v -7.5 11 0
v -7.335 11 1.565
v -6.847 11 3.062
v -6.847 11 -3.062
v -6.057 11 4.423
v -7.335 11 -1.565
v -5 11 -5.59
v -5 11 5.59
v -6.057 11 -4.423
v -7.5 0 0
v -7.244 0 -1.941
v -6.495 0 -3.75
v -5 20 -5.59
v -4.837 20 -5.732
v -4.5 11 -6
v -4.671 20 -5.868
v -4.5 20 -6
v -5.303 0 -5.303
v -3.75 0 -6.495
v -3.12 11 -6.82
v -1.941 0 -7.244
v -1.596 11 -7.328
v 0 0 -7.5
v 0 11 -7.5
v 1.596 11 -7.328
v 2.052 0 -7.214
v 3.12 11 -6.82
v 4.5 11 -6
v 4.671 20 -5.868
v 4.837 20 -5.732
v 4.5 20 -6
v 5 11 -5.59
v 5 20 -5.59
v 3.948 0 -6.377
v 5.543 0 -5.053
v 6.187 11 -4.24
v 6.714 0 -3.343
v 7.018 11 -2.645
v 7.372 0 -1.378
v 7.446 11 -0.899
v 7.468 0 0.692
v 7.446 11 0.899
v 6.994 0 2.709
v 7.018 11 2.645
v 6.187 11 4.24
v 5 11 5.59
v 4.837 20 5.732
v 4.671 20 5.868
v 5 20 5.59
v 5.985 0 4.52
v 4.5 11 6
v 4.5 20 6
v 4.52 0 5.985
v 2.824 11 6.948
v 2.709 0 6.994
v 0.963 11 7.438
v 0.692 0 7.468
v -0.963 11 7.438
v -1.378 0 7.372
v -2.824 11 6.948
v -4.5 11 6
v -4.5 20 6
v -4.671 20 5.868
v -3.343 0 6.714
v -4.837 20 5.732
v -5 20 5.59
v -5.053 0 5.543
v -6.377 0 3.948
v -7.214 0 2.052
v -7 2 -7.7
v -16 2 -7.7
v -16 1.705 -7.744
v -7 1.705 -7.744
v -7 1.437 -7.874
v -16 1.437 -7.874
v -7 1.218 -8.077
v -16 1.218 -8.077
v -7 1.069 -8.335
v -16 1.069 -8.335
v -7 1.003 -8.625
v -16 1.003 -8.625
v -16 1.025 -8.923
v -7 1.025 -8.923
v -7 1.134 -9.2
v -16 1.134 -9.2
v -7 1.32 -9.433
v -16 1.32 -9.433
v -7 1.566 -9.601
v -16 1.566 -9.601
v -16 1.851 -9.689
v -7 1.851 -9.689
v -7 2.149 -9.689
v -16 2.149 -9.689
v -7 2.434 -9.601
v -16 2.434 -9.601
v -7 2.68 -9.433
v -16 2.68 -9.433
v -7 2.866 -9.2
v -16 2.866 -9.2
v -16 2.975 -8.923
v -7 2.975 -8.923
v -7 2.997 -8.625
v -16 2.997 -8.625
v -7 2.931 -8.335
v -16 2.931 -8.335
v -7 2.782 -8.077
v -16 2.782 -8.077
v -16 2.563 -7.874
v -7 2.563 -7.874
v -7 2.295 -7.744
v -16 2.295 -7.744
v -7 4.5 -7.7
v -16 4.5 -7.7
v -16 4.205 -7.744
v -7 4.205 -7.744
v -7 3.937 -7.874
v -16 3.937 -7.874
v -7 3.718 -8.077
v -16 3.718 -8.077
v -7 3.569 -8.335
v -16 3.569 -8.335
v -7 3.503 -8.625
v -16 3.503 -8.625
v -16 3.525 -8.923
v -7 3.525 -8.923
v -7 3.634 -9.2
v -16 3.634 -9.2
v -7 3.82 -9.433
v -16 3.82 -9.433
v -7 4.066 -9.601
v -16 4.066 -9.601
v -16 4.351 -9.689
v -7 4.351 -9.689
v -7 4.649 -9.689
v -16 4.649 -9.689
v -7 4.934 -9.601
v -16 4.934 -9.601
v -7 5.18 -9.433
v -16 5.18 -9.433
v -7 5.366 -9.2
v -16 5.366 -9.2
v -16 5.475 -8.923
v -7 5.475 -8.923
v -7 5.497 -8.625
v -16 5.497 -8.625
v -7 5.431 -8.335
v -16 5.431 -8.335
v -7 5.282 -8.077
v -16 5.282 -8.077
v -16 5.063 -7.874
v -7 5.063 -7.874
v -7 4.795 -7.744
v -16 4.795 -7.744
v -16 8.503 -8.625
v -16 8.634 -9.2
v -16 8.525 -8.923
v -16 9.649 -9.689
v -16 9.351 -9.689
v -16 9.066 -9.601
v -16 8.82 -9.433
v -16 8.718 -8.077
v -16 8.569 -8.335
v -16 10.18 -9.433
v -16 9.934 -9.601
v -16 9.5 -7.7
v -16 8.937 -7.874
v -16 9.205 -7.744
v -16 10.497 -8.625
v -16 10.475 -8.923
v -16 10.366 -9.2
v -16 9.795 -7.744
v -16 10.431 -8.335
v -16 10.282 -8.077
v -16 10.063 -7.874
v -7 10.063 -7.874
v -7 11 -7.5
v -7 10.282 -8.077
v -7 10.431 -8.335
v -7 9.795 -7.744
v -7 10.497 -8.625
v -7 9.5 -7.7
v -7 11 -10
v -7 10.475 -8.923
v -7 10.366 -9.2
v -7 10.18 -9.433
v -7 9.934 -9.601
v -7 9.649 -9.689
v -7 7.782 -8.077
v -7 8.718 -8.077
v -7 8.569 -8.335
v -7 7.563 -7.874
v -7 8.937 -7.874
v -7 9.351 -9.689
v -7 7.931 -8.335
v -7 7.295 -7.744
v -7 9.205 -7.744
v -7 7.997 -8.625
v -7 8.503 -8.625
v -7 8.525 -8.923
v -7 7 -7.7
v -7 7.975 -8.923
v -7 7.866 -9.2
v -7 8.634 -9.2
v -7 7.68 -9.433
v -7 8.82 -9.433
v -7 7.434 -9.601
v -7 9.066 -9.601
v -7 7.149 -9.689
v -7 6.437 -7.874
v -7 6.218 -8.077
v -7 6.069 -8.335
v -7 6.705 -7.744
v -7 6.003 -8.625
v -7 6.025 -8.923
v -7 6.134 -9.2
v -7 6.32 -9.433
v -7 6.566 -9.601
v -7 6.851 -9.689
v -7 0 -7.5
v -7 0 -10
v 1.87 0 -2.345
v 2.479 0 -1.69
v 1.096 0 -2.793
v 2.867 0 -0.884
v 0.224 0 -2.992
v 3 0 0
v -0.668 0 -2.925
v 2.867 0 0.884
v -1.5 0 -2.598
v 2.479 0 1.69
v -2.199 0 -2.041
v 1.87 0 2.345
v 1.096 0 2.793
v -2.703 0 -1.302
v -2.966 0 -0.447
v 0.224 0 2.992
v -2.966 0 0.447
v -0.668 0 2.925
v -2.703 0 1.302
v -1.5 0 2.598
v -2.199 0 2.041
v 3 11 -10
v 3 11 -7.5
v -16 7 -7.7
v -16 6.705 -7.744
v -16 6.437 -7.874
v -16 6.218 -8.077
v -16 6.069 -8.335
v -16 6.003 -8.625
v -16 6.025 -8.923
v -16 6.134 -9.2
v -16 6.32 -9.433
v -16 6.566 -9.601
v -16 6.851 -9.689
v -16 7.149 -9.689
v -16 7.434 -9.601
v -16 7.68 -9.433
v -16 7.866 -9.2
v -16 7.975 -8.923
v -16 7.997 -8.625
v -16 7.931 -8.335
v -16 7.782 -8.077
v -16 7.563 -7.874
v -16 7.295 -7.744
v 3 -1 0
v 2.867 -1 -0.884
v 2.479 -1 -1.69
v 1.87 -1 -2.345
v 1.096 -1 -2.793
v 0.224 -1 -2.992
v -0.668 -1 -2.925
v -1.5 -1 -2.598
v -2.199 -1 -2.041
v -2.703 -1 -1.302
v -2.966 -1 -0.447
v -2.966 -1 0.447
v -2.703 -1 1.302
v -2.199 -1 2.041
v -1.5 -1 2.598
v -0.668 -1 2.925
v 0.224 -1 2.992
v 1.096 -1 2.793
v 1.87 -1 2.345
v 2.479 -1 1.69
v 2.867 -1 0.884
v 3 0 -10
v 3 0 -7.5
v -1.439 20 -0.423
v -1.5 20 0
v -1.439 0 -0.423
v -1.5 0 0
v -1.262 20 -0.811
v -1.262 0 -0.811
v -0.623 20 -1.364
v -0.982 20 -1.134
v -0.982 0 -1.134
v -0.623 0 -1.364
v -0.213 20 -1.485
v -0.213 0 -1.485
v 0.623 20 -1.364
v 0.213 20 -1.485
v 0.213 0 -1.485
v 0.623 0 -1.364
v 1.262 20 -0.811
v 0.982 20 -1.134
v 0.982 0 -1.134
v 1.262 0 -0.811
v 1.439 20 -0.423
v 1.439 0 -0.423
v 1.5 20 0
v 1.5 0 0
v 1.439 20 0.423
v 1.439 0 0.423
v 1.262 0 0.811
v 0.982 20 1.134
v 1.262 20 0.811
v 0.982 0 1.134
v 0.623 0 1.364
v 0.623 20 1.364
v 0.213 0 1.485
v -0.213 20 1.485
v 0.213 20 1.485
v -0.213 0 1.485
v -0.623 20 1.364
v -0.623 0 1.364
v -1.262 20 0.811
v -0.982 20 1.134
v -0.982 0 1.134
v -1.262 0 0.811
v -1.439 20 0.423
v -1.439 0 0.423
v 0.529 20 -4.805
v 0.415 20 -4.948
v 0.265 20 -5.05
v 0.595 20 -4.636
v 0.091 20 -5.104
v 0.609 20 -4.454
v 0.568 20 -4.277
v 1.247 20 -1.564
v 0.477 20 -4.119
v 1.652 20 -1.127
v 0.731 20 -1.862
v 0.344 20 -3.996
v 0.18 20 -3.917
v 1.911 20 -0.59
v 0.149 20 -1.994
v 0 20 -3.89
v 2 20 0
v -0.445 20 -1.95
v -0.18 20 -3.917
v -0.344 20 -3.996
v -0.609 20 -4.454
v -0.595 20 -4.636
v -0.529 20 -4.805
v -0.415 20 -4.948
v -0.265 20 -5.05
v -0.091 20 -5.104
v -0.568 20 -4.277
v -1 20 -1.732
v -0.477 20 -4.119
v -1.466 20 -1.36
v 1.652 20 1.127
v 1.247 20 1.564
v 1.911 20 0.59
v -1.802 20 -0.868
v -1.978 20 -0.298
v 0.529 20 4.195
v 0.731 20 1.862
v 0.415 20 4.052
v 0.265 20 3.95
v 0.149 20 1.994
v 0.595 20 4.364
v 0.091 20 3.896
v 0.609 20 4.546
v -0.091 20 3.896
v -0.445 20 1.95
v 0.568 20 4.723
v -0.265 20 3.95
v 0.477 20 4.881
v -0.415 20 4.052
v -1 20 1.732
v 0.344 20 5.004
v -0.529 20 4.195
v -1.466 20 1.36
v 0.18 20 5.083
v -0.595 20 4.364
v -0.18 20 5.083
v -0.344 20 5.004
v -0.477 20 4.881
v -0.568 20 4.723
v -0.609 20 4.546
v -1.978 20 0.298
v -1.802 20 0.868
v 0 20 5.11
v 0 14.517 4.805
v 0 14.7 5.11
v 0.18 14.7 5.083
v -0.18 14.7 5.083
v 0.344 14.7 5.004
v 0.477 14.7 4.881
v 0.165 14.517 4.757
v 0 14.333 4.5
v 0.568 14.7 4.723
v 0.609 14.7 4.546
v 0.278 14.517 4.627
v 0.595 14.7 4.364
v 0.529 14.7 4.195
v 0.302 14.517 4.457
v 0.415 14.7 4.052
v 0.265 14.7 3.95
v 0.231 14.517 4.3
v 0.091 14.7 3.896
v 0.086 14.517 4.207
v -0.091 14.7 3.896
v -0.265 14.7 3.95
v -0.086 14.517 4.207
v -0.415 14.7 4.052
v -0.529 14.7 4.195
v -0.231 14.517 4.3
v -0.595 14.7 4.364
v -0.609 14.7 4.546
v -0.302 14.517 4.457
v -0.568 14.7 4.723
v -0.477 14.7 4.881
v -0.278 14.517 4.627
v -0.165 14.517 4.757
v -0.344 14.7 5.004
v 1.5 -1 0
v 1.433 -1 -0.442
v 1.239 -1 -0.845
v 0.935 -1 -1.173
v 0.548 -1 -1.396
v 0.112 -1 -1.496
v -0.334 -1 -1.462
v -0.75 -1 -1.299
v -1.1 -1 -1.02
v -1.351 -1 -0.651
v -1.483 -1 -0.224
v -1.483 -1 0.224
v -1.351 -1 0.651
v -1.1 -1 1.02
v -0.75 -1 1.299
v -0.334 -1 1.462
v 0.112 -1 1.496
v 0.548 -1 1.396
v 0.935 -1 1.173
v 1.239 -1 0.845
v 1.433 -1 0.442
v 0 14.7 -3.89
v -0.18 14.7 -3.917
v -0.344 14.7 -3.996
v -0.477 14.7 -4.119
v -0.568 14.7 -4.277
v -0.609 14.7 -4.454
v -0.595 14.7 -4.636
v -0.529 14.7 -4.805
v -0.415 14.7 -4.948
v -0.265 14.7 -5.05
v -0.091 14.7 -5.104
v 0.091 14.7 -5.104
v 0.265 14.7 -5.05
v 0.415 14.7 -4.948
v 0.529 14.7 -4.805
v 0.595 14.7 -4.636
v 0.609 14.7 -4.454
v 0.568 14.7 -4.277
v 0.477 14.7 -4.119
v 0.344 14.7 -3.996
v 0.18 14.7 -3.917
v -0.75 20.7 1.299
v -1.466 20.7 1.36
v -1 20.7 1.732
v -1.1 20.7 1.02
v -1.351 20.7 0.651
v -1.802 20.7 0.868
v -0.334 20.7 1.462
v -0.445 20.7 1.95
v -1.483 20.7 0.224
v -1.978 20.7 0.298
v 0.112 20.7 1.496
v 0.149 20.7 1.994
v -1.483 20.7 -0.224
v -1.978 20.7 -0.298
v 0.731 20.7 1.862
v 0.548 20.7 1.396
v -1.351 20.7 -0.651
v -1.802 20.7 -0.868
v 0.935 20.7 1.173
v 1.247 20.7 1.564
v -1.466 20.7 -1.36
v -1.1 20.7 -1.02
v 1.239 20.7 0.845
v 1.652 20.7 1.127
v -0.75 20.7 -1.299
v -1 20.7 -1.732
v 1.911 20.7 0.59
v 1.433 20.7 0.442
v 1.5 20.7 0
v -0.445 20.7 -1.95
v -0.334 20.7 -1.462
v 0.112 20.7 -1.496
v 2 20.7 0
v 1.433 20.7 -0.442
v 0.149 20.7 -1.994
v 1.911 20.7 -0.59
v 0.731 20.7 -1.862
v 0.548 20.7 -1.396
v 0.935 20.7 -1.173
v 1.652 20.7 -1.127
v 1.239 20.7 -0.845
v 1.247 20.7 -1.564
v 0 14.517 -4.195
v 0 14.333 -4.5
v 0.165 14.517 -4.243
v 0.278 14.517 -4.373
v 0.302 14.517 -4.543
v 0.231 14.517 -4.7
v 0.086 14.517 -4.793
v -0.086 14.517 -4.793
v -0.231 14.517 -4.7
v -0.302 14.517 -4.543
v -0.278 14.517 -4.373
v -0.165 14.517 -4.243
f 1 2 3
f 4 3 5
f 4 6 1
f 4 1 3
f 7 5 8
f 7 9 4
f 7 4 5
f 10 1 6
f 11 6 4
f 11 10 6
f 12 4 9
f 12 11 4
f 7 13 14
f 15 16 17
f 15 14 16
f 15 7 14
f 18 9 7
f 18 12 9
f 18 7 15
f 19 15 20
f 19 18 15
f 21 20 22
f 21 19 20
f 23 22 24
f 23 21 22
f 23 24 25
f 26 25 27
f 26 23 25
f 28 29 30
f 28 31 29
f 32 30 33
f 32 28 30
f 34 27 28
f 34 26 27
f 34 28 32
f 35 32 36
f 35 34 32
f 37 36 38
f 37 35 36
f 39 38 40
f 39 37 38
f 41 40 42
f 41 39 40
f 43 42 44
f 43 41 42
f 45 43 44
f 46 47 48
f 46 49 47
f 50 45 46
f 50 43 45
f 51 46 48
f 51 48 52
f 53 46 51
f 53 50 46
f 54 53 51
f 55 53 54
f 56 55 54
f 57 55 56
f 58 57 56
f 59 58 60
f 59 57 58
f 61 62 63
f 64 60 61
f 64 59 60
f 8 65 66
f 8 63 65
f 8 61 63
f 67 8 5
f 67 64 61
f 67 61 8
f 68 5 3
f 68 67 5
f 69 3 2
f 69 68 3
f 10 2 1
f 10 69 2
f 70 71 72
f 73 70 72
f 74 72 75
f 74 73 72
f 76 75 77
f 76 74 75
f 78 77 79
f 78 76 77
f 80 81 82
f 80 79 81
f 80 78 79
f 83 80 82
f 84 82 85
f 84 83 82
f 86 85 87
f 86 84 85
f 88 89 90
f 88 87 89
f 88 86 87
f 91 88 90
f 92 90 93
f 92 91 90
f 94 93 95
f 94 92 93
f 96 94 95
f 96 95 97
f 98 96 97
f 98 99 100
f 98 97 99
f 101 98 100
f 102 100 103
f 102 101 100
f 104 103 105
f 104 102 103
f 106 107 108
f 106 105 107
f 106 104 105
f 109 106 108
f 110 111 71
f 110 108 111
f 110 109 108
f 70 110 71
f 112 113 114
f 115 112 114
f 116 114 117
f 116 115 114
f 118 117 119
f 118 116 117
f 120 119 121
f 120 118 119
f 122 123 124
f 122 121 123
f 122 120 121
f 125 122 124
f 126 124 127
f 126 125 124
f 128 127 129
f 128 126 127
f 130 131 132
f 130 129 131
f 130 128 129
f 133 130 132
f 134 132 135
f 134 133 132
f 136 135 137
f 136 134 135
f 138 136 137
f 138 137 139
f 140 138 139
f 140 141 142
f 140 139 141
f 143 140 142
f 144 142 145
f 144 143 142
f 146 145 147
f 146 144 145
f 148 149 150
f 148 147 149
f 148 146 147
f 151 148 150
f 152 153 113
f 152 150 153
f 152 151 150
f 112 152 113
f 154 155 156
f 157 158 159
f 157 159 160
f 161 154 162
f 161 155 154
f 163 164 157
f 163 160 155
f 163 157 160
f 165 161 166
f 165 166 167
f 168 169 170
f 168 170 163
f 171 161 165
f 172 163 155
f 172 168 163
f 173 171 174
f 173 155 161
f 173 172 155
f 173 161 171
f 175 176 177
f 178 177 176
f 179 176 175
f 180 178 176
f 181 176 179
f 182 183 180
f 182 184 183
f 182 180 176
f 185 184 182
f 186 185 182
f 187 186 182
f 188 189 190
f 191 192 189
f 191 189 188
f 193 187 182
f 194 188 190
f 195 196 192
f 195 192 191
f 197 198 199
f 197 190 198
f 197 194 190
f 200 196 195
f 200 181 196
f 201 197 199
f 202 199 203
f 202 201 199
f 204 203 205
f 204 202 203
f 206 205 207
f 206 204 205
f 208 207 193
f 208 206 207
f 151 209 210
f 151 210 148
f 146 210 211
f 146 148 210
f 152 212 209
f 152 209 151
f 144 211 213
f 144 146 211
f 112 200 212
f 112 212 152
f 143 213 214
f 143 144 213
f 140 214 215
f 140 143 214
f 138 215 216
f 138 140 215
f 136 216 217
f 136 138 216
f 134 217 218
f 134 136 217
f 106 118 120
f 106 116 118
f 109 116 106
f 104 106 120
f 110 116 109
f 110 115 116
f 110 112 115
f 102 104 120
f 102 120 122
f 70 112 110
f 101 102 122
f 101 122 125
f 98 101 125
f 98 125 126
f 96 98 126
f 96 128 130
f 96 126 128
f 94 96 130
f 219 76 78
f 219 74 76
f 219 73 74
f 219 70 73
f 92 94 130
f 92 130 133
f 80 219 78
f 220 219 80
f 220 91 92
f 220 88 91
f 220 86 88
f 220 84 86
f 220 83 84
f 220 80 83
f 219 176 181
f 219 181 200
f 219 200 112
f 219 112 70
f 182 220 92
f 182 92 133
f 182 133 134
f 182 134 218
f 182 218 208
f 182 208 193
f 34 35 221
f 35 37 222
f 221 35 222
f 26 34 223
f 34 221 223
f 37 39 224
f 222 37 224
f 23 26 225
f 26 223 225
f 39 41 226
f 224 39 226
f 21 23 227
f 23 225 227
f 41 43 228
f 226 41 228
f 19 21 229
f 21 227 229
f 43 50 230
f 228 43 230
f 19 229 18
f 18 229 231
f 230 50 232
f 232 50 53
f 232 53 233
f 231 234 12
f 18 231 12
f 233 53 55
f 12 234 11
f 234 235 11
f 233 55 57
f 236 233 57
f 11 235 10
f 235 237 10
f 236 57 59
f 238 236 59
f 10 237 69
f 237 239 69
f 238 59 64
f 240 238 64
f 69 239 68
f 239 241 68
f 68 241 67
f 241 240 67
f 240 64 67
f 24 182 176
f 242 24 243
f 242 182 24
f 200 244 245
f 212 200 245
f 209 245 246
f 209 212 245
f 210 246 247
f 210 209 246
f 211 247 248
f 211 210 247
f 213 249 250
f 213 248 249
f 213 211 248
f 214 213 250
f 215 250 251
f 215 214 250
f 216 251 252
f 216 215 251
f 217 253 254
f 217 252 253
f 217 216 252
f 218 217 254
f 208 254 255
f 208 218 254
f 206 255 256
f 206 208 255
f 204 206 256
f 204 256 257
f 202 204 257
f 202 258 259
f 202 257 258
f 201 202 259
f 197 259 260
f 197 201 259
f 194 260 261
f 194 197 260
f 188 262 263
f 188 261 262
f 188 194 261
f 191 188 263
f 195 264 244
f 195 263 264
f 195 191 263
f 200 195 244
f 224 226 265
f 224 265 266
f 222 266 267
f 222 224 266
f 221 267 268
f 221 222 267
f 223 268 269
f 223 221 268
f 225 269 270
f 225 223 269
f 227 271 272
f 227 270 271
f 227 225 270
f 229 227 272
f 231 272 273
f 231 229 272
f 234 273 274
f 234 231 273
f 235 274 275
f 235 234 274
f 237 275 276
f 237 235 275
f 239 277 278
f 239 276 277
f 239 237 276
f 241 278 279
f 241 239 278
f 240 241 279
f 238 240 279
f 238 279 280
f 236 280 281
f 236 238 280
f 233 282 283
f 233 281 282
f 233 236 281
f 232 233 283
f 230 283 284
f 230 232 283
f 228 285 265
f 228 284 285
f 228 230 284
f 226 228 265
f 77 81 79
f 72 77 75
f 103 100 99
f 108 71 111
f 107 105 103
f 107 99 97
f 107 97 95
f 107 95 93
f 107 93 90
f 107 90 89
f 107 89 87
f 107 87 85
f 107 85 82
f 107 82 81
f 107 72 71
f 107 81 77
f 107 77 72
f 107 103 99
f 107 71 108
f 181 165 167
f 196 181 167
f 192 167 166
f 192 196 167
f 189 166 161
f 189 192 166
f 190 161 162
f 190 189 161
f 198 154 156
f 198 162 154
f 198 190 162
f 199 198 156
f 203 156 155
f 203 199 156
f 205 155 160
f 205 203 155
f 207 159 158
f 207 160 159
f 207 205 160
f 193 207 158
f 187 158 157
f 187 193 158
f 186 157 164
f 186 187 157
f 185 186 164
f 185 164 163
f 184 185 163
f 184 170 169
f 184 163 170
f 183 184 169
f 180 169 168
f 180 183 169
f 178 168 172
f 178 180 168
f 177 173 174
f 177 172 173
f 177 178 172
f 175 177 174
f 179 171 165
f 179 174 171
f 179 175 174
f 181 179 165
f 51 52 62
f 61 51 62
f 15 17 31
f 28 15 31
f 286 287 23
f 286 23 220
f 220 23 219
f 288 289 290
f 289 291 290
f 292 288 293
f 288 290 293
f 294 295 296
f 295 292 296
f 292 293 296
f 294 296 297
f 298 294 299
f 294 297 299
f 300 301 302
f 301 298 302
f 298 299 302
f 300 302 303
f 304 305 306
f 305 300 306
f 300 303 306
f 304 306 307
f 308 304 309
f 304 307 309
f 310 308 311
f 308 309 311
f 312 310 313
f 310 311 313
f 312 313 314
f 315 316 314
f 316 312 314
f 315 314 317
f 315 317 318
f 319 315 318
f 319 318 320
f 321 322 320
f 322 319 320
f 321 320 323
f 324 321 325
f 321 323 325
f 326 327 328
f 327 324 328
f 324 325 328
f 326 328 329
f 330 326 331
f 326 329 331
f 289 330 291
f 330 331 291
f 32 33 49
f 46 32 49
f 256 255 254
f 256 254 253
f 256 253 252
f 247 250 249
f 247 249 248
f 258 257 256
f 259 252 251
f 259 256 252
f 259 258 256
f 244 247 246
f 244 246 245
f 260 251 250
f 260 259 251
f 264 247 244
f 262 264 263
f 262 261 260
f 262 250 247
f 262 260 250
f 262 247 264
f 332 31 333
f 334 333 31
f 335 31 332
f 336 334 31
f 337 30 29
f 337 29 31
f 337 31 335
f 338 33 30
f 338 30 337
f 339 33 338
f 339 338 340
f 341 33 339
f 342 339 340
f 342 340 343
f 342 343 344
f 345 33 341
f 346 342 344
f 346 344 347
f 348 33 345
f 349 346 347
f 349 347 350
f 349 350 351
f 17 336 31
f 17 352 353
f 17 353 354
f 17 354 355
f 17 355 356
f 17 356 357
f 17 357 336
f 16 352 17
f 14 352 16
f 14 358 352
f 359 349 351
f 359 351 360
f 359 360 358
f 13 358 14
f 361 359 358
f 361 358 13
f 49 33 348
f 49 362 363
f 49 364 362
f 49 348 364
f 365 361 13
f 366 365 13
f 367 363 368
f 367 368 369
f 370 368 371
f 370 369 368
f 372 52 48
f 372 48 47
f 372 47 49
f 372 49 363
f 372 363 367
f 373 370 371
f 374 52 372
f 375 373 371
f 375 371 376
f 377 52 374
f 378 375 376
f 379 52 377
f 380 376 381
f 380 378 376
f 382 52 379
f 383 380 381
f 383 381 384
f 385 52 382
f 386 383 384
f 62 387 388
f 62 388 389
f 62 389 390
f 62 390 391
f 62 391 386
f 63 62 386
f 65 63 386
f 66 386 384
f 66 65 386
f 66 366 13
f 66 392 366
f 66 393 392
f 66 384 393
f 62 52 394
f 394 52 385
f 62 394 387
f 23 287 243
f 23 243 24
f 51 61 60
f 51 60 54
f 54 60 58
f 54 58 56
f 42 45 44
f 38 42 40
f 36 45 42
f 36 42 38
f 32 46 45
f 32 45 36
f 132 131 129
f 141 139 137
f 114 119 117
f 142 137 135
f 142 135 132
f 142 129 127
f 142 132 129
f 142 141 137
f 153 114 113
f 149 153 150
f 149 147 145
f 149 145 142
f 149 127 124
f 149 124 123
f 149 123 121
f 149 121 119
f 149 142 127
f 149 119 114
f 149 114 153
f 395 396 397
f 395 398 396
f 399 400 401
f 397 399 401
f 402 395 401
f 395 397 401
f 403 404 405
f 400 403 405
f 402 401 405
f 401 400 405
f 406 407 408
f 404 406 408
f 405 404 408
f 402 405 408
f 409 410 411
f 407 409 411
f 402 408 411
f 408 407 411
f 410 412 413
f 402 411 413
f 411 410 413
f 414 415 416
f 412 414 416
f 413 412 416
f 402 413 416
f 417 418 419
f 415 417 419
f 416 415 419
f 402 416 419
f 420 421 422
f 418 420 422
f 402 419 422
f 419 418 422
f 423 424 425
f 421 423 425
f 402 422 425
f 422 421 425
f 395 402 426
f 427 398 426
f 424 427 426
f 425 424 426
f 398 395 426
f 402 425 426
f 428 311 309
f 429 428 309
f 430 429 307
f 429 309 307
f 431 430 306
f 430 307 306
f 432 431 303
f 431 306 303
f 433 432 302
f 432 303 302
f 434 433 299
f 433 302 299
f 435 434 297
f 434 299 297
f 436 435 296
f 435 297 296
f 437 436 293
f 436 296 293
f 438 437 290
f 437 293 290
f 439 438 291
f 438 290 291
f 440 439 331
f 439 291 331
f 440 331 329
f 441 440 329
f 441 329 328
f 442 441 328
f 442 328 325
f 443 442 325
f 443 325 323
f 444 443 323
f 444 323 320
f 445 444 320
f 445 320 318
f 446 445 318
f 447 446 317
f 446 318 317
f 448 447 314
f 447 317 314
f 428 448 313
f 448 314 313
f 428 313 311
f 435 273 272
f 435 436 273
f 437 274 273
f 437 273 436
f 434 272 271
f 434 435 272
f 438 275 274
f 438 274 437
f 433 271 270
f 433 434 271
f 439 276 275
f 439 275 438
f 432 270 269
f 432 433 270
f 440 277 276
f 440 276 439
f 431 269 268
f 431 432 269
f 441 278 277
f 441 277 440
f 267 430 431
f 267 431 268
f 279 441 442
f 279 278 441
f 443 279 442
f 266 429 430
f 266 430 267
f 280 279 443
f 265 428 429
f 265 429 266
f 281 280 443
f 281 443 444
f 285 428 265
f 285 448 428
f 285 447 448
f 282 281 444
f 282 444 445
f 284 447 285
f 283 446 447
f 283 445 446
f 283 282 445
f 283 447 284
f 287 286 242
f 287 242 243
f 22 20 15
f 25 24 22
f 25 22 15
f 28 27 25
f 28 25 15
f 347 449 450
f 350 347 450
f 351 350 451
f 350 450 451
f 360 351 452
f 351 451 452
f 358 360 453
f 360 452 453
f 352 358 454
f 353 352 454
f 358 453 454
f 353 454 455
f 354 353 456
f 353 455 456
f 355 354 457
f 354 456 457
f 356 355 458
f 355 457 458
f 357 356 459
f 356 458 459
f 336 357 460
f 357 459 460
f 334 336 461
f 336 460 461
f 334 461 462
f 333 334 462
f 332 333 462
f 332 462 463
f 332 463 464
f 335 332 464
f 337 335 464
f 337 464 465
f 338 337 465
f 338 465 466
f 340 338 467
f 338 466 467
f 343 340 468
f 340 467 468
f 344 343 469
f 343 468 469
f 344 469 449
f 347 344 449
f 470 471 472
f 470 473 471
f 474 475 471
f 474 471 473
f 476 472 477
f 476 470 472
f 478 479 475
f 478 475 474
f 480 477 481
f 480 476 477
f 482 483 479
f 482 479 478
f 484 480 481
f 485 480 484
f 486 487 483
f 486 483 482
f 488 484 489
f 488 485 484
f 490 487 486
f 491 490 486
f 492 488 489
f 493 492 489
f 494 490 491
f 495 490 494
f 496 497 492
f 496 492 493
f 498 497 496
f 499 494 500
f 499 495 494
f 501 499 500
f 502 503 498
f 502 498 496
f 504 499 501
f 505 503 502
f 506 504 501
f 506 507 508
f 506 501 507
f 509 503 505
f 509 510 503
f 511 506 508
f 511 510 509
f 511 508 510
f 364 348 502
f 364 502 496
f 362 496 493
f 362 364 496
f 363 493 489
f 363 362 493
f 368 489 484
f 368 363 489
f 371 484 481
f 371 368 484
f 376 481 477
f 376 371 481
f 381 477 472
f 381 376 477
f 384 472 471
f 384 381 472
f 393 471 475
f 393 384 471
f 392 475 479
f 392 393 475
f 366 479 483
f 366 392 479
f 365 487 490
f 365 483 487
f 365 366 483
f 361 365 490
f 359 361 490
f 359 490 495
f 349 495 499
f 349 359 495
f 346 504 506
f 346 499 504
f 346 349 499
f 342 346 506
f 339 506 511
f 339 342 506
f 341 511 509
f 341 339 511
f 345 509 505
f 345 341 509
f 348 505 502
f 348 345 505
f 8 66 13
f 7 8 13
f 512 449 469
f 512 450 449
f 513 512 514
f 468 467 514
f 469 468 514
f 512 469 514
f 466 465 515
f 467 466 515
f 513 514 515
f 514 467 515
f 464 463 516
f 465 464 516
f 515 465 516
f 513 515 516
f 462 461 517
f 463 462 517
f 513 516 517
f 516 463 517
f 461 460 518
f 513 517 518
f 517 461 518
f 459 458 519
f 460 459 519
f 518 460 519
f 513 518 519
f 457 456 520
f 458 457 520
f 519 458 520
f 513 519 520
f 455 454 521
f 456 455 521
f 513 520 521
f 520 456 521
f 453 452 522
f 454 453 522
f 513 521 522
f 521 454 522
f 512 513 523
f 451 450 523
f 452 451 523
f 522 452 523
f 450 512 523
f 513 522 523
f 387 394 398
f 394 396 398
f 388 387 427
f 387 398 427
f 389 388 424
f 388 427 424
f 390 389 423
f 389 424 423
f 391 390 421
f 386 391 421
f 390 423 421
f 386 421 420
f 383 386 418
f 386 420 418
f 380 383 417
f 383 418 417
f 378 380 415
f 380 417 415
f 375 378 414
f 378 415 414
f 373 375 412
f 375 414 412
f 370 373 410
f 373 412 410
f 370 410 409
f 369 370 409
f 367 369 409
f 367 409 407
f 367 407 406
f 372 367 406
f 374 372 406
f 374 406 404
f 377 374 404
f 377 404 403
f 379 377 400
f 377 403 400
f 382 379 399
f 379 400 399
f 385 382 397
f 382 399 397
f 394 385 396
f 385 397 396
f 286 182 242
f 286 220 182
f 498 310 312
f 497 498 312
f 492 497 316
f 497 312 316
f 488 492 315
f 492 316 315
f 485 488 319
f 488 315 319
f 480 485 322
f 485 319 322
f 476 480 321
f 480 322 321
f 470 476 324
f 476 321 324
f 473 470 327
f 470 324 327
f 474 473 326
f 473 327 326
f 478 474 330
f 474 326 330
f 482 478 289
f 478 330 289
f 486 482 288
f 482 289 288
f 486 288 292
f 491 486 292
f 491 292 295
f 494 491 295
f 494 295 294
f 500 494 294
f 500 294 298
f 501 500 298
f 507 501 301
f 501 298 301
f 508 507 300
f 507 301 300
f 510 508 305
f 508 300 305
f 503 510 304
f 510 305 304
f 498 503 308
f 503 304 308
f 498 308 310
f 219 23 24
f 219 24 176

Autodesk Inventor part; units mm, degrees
ref_plane "YZ Plane" through (0, 0, 0) normal (1, 0, 0) x (0, 1, 0)
ref_plane "XZ Plane" through (0, 0, 0) normal (0, 1, 0) x (-1, 0, 0)
ref_plane "XY Plane" through (0, 0, 0) normal (0, 0, 1) x (1, 0, 0)
sketch "Sketch1" plane through (0, 0, 0) normal (0, 1, 0) x (-1, 0, 0)
  circle A0 centre (0, 0) radius 7.5
  line L0 (-3, -7.5) -> (7, -7.5)
  line L1 (7, -7.5) -> (7, -10)
  line L2 (7, -10) -> (-3, -10)
  line L3 (-3, -10) -> (-3, -7.5)
  circle A1 centre (0, 0) radius 1.5
  dimension "d0" = 15
  dimension "d1" = 3
  dimension "d2" = 10
  dimension "d4" = 10
  dimension "d15" = 3
extrude "Extrusion3" add sketch "Sketch1" along normal blind 20
sketch "Sketch3" plane through (0, 20, 0) normal (0, 1, 0) x (1, 0, 0)
  line L0 (5, -6) -> (-5, -6)
  line L1 (-5, -6) -> (-5, 6)
  line L2 (-5, 6) -> (5, 6)
  line L3 (5, 6) -> (5, -6)
  line L4 (15, -15) -> (-15, -15)
  line L5 (-15, -15) -> (-15, 15)
  line L6 (-15, 15) -> (15, 15)
  line L7 (15, 15) -> (15, -15)
  point P0 (0, 0)
  point P1 (0, -6)
  point P2 (-5, 0)
  dimension "d18" = 10
  dimension "d19" = 12
  dimension "d20" = 30
  dimension "d21" = 30
  dimension "d22" = 15
  dimension "d23" = 15
extrude "Extrusion4" cut sketch "Sketch3" against normal blind 9
sketch "Sketch4" plane through (-7, 0, -10) normal (-1, 0, 0) x (0, 0, 1)
  circle A0 centre (1.3, 9.5) radius 1
  circle A1 centre (1.3, 7) radius 1
  circle A2 centre (1.3, 4.5) radius 1
  circle A3 centre (1.3, 2) radius 1
  line L0 (2.5, 0) -> (17.5, 0) projected
  line L1 (0, 0) -> (0, 11) projected
  point P0 (10, 0)
  dimension "d26" = 2
  dimension "d27" = 2.5
  dimension "d28" = 2.5
  dimension "d29" = 2.5
  dimension "d30" = 2
  dimension "d31" = 1.3
extrude "Extrusion5" add sketch "Sketch4" along normal blind 9
sketch "Sketch5" plane through (0, 20, 0) normal (0, 1, 0) x (1, 0, 0)
  point P0 (0, 0)
  point P1 (0, -4.5)
  point P2 (0, 4.5)
  dimension "d34" = 9
  dimension "d35" = 4.5
hole "Hole1" at (0, 20, 4.5) at (0, 20, -4.5) direction (0, -1, 0) diameter 1.221 depth 5.3 tip angle 118 thread size "M1.6x0.35" class "6H" standard "ISO Metric profile"
sketch "Sketch6" plane through (0, 0, 0) normal (0, -1, 0) x (1, 0, 0)
  circle A0 centre (0, 0) radius 3
  circle A1 centre (0, 0) radius 1.5 projected
  dimension "d43" = 6
extrude "Extrusion6" add sketch "Sketch6" along normal blind 1
sketch "Sketch7" plane through (0, 20, 0) normal (0, 1, 0) x (1, 0, 0)
  circle A0 centre (0, 0) radius 1.5 projected
  circle A1 centre (0, 0) radius 2
  dimension "d46" = 4
extrude "Extrusion7" add sketch "Sketch7" along normal blind 0.7
properties part number "Motor-Body"
